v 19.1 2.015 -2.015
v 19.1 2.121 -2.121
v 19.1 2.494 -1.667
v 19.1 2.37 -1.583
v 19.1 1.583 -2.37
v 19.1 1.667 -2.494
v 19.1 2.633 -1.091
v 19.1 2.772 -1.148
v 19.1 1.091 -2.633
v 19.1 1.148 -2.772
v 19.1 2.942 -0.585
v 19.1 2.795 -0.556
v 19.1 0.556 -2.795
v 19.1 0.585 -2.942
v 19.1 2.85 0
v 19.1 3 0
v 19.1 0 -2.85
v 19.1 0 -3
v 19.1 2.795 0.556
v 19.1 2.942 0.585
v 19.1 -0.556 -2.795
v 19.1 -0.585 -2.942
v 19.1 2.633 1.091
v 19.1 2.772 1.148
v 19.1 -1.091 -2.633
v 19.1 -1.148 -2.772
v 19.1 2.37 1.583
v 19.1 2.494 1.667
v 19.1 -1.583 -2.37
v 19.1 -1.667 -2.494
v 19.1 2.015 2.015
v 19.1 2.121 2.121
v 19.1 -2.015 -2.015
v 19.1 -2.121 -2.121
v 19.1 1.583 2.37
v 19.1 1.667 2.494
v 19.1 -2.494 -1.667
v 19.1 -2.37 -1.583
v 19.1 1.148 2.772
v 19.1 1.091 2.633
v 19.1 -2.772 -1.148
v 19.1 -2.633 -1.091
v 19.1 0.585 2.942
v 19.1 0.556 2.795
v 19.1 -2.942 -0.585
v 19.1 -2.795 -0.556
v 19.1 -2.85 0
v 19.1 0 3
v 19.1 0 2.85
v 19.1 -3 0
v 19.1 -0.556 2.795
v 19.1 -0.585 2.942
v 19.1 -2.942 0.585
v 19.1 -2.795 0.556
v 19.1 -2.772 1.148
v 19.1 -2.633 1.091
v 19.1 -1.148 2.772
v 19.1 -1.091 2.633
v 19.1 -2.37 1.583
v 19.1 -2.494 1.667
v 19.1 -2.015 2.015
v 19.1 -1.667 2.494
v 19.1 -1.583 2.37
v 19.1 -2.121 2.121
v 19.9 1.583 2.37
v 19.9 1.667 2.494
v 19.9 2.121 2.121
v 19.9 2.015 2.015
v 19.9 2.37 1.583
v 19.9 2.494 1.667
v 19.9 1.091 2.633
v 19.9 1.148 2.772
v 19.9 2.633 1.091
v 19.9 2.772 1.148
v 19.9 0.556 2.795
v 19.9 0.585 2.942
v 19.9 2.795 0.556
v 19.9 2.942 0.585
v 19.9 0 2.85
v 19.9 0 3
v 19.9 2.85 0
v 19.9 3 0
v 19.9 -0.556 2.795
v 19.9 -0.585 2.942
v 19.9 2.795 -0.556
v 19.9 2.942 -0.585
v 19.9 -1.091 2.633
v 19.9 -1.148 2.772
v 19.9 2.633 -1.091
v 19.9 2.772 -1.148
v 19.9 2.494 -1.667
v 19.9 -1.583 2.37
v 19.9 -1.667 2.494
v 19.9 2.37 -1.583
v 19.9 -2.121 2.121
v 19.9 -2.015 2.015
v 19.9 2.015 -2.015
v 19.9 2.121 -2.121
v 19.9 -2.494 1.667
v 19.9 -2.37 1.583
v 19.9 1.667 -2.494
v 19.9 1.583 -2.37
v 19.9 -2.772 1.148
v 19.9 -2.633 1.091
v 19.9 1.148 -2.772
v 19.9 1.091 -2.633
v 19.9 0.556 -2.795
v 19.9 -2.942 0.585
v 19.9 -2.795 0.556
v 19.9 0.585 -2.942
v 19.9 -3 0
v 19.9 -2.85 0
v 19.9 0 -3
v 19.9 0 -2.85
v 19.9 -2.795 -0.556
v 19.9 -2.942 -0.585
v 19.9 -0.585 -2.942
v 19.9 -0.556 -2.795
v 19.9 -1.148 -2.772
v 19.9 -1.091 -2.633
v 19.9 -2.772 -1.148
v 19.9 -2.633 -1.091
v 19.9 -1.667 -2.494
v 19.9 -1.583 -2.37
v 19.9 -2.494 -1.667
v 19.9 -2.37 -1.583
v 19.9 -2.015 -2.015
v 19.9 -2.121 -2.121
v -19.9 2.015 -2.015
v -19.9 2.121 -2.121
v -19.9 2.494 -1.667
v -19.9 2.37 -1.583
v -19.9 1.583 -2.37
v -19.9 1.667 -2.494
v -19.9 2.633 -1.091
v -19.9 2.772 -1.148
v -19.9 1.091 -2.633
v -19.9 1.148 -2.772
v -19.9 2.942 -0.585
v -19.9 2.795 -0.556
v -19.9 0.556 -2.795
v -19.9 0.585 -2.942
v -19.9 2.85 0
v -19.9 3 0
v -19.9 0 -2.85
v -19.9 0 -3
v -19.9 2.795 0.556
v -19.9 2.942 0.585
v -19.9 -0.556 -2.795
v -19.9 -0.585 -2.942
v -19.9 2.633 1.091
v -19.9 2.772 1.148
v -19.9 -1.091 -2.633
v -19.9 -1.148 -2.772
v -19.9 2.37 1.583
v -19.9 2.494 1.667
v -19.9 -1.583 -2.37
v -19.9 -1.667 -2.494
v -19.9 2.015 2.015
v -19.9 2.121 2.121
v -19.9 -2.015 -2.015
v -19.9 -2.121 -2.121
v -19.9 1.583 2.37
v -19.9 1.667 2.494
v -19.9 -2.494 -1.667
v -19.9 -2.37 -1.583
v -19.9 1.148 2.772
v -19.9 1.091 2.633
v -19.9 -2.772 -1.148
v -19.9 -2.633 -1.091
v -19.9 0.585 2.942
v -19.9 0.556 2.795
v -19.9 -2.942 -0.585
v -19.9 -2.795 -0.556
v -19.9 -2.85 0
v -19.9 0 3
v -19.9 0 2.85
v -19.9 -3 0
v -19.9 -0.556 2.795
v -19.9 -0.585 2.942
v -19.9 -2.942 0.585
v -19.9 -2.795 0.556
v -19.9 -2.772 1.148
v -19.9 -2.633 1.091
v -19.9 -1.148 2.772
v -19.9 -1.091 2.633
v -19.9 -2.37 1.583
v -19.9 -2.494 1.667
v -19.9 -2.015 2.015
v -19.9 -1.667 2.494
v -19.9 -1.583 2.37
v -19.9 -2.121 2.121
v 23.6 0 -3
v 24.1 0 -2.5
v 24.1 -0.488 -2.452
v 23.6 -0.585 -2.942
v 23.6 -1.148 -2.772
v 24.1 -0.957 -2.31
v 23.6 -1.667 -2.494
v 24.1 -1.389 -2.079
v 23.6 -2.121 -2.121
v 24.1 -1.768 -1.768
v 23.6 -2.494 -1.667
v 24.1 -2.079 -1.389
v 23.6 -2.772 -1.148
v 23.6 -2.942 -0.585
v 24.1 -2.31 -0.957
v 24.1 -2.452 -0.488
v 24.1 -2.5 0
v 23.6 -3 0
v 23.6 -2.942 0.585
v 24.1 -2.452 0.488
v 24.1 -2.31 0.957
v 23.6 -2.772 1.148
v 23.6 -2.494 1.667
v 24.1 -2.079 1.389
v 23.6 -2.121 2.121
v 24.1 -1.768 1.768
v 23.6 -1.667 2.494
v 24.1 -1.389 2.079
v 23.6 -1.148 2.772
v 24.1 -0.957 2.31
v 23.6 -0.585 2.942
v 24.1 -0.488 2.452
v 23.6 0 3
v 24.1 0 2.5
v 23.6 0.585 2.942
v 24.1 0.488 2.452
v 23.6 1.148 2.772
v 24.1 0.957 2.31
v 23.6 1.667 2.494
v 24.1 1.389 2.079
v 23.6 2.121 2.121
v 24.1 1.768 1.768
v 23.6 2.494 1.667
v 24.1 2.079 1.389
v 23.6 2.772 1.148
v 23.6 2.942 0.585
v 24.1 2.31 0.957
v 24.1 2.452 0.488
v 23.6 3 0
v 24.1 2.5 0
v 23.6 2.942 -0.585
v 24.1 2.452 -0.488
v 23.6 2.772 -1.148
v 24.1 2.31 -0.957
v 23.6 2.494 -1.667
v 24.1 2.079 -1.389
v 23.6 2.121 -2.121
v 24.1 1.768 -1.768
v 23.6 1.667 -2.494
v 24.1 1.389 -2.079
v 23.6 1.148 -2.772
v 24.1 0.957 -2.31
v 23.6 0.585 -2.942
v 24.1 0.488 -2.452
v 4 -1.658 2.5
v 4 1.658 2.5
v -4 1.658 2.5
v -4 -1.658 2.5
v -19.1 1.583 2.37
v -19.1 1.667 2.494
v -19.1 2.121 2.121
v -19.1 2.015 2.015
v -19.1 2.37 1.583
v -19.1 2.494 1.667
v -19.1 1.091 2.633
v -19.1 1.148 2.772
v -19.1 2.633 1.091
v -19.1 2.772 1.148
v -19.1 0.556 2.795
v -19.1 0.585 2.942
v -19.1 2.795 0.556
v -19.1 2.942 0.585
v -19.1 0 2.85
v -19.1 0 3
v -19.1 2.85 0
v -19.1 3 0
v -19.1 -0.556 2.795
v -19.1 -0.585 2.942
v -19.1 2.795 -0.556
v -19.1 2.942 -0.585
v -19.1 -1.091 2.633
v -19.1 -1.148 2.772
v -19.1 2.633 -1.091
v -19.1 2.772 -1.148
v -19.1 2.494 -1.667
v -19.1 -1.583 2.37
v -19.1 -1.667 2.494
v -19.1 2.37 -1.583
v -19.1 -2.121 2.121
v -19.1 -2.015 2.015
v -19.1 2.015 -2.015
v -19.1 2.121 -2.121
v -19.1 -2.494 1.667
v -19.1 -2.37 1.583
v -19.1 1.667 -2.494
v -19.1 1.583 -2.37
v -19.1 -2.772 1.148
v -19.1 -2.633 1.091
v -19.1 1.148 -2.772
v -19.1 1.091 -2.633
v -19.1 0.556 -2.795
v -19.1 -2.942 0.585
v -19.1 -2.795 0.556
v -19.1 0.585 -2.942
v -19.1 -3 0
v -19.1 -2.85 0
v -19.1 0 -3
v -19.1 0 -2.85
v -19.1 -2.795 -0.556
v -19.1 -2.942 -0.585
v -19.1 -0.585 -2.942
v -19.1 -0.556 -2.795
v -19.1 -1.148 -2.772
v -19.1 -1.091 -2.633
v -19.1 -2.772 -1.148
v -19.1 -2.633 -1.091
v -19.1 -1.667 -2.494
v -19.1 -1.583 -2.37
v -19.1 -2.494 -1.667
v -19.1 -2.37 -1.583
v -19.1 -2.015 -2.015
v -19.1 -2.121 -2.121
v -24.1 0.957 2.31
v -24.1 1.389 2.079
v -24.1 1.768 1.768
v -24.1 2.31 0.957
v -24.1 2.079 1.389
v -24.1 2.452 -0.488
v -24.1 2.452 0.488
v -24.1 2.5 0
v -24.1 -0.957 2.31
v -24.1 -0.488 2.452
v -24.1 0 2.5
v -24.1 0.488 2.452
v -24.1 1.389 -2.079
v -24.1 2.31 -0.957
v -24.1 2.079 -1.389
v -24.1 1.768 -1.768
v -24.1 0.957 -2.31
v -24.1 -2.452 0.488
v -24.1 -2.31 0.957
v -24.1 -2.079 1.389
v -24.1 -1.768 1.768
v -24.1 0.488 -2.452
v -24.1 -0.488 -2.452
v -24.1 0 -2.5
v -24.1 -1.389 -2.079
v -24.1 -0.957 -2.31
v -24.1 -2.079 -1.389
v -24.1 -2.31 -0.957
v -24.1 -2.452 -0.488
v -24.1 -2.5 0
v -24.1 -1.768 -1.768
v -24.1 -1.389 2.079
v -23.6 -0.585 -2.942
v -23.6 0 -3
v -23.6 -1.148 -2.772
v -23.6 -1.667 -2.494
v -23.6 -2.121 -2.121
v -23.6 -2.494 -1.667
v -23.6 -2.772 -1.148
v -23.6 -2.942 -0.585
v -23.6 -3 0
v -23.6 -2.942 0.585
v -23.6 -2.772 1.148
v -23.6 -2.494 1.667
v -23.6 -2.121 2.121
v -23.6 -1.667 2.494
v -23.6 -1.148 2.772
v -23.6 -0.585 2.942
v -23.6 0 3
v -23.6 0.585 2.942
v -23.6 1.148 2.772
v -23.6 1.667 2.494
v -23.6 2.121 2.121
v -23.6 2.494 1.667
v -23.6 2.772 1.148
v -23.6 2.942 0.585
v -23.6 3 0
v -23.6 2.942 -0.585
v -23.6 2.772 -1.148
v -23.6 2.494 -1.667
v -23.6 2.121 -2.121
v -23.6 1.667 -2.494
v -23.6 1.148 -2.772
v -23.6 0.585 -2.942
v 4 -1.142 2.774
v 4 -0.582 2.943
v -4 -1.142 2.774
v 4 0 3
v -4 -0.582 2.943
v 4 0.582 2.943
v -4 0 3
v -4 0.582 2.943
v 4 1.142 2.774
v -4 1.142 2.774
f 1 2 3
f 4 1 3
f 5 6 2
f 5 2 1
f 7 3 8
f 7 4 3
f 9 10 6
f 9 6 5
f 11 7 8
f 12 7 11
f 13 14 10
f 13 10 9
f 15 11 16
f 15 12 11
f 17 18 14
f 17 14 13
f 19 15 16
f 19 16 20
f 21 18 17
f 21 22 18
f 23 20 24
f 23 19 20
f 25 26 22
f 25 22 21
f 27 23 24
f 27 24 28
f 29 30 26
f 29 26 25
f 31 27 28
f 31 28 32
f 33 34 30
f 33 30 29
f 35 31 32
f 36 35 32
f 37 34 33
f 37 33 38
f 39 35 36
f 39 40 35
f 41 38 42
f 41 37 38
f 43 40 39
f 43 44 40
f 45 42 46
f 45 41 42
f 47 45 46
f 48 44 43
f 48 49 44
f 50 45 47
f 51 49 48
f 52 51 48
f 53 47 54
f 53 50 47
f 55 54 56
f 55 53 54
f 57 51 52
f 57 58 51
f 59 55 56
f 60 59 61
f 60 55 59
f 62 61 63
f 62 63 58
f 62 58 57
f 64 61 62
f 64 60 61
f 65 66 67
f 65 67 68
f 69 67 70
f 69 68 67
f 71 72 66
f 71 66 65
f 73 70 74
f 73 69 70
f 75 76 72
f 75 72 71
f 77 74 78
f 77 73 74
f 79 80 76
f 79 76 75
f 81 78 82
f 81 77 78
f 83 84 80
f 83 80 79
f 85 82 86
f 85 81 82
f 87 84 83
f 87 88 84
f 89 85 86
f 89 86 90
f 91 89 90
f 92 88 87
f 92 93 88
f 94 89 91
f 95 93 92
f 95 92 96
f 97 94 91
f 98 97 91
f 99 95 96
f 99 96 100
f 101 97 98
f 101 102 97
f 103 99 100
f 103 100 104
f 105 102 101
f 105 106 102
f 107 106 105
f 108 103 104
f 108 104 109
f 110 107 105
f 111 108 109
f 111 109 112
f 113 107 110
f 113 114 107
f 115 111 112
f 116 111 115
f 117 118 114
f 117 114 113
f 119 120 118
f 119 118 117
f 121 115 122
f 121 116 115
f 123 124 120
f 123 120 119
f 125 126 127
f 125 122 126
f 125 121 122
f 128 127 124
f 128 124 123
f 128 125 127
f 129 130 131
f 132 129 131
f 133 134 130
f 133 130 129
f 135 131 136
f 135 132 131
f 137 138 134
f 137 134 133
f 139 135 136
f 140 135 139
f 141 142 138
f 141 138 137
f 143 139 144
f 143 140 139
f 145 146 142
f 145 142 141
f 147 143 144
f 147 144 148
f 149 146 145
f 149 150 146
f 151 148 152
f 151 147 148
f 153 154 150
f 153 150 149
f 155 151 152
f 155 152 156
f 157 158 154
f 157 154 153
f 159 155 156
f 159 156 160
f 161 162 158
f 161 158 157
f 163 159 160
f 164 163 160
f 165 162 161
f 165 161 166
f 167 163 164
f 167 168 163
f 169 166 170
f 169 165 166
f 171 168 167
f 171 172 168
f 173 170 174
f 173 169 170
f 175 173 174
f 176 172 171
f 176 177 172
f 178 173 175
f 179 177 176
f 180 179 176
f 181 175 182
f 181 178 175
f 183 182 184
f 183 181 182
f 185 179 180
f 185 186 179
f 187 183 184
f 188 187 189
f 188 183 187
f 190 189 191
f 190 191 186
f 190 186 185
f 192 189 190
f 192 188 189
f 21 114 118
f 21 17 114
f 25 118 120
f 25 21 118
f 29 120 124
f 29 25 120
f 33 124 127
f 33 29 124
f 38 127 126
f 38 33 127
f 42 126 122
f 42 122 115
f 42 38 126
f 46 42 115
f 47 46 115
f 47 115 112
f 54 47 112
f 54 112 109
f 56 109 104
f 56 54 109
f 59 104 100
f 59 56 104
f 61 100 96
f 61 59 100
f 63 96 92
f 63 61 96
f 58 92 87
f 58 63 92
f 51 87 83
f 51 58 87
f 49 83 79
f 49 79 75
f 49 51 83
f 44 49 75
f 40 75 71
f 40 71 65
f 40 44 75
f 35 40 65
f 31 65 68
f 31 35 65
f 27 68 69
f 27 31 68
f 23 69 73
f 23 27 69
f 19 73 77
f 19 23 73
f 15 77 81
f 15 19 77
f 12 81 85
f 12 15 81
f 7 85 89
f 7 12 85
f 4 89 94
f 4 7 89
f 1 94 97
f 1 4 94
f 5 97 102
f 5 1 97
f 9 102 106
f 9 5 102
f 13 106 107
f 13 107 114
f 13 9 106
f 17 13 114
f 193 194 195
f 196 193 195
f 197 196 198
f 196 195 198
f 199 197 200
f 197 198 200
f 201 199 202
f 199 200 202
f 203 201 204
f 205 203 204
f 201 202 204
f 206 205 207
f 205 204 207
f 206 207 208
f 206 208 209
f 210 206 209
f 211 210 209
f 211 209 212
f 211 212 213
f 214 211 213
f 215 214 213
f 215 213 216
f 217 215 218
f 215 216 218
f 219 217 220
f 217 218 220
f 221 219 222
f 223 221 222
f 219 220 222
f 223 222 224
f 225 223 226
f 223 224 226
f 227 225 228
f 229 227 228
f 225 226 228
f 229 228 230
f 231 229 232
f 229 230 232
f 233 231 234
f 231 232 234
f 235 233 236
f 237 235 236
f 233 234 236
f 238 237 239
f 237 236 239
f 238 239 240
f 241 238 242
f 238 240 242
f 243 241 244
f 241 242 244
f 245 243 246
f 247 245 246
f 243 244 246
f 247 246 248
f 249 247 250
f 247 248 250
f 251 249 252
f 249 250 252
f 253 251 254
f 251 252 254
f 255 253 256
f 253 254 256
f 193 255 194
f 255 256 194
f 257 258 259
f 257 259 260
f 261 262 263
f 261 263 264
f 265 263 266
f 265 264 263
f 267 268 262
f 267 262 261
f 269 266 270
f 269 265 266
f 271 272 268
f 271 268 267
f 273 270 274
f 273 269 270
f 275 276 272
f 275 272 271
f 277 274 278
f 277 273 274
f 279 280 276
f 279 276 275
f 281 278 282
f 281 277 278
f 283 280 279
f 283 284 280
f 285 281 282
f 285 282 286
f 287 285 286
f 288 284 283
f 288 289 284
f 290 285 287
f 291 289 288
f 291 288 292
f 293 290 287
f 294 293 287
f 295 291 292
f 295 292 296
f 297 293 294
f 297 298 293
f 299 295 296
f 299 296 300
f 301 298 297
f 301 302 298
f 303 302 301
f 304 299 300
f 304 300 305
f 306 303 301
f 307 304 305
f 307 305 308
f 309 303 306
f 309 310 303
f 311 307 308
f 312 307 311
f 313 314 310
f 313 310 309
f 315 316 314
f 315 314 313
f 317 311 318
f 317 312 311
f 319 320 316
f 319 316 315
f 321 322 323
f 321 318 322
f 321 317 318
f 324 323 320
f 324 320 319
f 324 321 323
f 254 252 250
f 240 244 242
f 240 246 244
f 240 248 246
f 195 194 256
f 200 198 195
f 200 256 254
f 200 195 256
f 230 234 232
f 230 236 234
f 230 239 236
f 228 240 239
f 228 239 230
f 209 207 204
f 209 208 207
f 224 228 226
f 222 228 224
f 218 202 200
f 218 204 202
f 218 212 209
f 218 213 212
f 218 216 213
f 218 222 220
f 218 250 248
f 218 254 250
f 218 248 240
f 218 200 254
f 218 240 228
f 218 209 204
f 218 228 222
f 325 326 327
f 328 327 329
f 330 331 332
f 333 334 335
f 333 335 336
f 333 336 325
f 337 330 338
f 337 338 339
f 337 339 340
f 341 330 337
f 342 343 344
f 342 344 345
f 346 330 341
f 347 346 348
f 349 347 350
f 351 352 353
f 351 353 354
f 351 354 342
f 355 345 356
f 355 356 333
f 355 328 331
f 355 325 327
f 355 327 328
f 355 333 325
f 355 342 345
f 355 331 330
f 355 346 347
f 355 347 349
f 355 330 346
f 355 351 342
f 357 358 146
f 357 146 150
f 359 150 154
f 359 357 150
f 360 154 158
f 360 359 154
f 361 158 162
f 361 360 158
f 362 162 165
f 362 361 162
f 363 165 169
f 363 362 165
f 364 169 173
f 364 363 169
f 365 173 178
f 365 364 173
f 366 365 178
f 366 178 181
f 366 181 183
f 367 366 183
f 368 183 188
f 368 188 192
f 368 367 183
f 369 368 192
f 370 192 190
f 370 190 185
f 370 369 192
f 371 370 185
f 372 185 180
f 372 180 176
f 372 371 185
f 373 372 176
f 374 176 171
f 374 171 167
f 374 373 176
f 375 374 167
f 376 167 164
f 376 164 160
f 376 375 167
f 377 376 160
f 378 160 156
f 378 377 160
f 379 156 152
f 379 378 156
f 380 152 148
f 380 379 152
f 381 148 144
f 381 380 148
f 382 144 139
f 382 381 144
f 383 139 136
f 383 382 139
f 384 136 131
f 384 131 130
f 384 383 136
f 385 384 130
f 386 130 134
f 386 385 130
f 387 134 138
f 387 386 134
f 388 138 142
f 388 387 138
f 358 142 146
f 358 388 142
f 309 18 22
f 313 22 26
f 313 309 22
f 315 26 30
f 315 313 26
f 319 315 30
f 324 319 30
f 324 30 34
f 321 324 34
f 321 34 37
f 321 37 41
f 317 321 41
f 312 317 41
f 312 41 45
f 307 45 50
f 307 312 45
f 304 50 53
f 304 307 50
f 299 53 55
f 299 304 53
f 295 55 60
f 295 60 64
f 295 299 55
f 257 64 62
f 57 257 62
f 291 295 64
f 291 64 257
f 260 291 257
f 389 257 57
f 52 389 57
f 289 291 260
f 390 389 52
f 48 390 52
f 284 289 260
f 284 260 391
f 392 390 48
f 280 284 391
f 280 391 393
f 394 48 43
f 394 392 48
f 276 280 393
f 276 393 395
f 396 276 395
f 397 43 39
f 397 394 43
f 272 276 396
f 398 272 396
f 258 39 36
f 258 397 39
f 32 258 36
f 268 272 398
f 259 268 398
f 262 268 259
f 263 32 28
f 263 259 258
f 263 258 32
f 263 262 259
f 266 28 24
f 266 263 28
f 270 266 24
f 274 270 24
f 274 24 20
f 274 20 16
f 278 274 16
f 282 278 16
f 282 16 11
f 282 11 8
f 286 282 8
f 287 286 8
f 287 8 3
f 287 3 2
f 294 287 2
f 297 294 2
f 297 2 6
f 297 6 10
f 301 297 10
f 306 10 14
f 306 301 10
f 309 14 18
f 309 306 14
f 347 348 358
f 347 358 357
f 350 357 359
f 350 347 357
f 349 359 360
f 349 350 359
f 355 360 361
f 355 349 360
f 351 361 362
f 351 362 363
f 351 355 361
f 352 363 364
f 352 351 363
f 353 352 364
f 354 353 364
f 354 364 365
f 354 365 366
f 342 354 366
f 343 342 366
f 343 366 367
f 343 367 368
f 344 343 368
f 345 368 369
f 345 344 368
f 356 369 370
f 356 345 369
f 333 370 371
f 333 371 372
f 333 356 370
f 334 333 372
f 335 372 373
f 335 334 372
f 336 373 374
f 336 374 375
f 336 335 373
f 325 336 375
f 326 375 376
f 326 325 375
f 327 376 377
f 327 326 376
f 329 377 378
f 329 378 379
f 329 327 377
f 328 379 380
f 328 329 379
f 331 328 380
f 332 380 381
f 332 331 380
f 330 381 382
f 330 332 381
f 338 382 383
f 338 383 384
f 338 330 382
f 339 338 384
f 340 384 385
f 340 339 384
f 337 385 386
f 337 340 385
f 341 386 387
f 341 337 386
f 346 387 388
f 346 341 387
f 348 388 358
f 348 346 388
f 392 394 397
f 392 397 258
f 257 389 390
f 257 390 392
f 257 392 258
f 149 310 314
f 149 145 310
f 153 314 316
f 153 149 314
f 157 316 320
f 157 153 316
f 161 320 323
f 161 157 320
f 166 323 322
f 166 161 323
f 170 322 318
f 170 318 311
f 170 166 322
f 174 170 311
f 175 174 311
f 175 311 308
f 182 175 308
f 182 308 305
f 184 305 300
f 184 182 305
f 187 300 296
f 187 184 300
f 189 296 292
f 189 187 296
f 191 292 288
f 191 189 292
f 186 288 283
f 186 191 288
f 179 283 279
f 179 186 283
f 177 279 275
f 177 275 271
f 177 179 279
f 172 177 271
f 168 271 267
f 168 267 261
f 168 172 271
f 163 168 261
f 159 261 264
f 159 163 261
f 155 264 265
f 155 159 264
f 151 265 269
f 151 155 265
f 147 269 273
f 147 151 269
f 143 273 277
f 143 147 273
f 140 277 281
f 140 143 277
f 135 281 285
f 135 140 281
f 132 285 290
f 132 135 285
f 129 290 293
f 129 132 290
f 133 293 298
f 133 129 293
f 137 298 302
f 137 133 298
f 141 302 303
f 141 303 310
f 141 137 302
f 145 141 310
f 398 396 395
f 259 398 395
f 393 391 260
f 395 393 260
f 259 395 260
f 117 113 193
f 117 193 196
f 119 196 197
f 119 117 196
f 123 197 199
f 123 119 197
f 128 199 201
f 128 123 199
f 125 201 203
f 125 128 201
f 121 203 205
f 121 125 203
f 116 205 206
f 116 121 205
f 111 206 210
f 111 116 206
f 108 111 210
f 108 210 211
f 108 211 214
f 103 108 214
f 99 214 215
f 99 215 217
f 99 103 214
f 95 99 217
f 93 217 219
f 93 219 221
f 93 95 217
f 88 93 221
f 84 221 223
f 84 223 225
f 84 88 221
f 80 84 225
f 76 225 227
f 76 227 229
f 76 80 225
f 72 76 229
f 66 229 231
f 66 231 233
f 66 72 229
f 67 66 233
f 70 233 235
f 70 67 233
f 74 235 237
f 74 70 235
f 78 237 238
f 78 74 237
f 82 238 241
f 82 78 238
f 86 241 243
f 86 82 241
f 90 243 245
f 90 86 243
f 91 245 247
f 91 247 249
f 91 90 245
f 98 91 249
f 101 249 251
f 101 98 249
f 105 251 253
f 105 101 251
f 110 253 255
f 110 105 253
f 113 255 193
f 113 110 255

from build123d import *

# Parameters (mm, degrees)
CORTAR_EXTRUIR1_DEPTH = 4
CHAFL_N1_SIZE         = 0.5


with BuildPart() as part:
    # Croquis1 → Revolución1 (revolve)
    with BuildSketch(Plane(origin=(0, 0, 0), x_dir=(-1, 0, 0), z_dir=(0, 1, 0)), mode=Mode.PRIVATE) as revoluci_n1_sk:
        Polygon((-19.1, 3), (19.1, 3), (19.1, 2.85), (19.9, 2.85), (19.9, 3), (24.1, 3), (24.1, 0), (-24.1, 0), (-24.1, 3), (-19.9, 3), (-19.9, 2.85), (-19.1, 2.85), align=None)
    revolve(revoluci_n1_sk.sketch.rotate(Axis((24.1, 0, 0), (-1, 0, 0)), 180), axis=Axis((24.1, 0, 0), (-1, 0, 0)))

    # Croquis2 → Cortar-Extruir1 (cut, symmetric)
    with BuildSketch(Plane.YZ):
        with BuildLine():
            Line((1.658312395, 2.5), (-1.658312395, 2.5))
            ThreePointArc((-1.658312395, 2.5), (0, 3), (1.658312395, 2.5))
        make_face()
    extrude(amount=CORTAR_EXTRUIR1_DEPTH, both=True, mode=Mode.SUBTRACT)

    # Chaflán1
    chafl_n1_edges = [part.edges().sort_by_distance(p)[0] for p in [
        (24.1, 0, 3),
        (-24.1, 0, 3),
    ]]
    chamfer(chafl_n1_edges, length=CHAFL_N1_SIZE)


solid = part.part
